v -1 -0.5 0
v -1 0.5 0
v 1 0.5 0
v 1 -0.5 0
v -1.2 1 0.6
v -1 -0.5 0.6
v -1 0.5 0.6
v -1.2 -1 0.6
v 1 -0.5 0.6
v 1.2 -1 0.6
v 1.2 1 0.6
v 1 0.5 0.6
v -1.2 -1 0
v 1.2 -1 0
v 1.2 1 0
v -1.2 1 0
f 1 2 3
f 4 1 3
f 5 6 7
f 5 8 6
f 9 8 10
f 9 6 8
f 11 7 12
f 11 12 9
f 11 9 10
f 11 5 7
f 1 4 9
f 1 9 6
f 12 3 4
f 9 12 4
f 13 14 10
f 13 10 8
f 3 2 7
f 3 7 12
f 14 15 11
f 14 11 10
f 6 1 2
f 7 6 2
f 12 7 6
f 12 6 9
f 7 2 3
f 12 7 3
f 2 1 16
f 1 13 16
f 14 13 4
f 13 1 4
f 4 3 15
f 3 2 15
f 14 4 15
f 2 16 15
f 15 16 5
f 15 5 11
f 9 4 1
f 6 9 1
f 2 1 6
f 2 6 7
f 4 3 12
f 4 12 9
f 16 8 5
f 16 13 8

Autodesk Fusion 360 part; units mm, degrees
sketch "Sketch1" plane through (0, 0, 0) normal (0, 0, 1) x (1, 0, 0)
  line L0 (-1.2, 1) -> (1.2, 1)
  line L1 (1.2, 1) -> (1.2, -1)
  line L2 (1.2, -1) -> (-1.2, -1)
  line L3 (-1.2, -1) -> (-1.2, 1)
  line L4 (-1, 0.5) -> (1, 0.5)
  line L5 (1, 0.5) -> (1, -0.5)
  line L6 (1, -0.5) -> (-1, -0.5)
  line L7 (-1, -0.5) -> (-1, 0.5)
extrude "Extrude1" add sketch "Sketch1" along normal blind 0.6 makes body 1
extrude "Extrude2" add sketch "Sketch1" along normal blind 0.6 separate body contours L4 L5 L6 L7 makes body 2
